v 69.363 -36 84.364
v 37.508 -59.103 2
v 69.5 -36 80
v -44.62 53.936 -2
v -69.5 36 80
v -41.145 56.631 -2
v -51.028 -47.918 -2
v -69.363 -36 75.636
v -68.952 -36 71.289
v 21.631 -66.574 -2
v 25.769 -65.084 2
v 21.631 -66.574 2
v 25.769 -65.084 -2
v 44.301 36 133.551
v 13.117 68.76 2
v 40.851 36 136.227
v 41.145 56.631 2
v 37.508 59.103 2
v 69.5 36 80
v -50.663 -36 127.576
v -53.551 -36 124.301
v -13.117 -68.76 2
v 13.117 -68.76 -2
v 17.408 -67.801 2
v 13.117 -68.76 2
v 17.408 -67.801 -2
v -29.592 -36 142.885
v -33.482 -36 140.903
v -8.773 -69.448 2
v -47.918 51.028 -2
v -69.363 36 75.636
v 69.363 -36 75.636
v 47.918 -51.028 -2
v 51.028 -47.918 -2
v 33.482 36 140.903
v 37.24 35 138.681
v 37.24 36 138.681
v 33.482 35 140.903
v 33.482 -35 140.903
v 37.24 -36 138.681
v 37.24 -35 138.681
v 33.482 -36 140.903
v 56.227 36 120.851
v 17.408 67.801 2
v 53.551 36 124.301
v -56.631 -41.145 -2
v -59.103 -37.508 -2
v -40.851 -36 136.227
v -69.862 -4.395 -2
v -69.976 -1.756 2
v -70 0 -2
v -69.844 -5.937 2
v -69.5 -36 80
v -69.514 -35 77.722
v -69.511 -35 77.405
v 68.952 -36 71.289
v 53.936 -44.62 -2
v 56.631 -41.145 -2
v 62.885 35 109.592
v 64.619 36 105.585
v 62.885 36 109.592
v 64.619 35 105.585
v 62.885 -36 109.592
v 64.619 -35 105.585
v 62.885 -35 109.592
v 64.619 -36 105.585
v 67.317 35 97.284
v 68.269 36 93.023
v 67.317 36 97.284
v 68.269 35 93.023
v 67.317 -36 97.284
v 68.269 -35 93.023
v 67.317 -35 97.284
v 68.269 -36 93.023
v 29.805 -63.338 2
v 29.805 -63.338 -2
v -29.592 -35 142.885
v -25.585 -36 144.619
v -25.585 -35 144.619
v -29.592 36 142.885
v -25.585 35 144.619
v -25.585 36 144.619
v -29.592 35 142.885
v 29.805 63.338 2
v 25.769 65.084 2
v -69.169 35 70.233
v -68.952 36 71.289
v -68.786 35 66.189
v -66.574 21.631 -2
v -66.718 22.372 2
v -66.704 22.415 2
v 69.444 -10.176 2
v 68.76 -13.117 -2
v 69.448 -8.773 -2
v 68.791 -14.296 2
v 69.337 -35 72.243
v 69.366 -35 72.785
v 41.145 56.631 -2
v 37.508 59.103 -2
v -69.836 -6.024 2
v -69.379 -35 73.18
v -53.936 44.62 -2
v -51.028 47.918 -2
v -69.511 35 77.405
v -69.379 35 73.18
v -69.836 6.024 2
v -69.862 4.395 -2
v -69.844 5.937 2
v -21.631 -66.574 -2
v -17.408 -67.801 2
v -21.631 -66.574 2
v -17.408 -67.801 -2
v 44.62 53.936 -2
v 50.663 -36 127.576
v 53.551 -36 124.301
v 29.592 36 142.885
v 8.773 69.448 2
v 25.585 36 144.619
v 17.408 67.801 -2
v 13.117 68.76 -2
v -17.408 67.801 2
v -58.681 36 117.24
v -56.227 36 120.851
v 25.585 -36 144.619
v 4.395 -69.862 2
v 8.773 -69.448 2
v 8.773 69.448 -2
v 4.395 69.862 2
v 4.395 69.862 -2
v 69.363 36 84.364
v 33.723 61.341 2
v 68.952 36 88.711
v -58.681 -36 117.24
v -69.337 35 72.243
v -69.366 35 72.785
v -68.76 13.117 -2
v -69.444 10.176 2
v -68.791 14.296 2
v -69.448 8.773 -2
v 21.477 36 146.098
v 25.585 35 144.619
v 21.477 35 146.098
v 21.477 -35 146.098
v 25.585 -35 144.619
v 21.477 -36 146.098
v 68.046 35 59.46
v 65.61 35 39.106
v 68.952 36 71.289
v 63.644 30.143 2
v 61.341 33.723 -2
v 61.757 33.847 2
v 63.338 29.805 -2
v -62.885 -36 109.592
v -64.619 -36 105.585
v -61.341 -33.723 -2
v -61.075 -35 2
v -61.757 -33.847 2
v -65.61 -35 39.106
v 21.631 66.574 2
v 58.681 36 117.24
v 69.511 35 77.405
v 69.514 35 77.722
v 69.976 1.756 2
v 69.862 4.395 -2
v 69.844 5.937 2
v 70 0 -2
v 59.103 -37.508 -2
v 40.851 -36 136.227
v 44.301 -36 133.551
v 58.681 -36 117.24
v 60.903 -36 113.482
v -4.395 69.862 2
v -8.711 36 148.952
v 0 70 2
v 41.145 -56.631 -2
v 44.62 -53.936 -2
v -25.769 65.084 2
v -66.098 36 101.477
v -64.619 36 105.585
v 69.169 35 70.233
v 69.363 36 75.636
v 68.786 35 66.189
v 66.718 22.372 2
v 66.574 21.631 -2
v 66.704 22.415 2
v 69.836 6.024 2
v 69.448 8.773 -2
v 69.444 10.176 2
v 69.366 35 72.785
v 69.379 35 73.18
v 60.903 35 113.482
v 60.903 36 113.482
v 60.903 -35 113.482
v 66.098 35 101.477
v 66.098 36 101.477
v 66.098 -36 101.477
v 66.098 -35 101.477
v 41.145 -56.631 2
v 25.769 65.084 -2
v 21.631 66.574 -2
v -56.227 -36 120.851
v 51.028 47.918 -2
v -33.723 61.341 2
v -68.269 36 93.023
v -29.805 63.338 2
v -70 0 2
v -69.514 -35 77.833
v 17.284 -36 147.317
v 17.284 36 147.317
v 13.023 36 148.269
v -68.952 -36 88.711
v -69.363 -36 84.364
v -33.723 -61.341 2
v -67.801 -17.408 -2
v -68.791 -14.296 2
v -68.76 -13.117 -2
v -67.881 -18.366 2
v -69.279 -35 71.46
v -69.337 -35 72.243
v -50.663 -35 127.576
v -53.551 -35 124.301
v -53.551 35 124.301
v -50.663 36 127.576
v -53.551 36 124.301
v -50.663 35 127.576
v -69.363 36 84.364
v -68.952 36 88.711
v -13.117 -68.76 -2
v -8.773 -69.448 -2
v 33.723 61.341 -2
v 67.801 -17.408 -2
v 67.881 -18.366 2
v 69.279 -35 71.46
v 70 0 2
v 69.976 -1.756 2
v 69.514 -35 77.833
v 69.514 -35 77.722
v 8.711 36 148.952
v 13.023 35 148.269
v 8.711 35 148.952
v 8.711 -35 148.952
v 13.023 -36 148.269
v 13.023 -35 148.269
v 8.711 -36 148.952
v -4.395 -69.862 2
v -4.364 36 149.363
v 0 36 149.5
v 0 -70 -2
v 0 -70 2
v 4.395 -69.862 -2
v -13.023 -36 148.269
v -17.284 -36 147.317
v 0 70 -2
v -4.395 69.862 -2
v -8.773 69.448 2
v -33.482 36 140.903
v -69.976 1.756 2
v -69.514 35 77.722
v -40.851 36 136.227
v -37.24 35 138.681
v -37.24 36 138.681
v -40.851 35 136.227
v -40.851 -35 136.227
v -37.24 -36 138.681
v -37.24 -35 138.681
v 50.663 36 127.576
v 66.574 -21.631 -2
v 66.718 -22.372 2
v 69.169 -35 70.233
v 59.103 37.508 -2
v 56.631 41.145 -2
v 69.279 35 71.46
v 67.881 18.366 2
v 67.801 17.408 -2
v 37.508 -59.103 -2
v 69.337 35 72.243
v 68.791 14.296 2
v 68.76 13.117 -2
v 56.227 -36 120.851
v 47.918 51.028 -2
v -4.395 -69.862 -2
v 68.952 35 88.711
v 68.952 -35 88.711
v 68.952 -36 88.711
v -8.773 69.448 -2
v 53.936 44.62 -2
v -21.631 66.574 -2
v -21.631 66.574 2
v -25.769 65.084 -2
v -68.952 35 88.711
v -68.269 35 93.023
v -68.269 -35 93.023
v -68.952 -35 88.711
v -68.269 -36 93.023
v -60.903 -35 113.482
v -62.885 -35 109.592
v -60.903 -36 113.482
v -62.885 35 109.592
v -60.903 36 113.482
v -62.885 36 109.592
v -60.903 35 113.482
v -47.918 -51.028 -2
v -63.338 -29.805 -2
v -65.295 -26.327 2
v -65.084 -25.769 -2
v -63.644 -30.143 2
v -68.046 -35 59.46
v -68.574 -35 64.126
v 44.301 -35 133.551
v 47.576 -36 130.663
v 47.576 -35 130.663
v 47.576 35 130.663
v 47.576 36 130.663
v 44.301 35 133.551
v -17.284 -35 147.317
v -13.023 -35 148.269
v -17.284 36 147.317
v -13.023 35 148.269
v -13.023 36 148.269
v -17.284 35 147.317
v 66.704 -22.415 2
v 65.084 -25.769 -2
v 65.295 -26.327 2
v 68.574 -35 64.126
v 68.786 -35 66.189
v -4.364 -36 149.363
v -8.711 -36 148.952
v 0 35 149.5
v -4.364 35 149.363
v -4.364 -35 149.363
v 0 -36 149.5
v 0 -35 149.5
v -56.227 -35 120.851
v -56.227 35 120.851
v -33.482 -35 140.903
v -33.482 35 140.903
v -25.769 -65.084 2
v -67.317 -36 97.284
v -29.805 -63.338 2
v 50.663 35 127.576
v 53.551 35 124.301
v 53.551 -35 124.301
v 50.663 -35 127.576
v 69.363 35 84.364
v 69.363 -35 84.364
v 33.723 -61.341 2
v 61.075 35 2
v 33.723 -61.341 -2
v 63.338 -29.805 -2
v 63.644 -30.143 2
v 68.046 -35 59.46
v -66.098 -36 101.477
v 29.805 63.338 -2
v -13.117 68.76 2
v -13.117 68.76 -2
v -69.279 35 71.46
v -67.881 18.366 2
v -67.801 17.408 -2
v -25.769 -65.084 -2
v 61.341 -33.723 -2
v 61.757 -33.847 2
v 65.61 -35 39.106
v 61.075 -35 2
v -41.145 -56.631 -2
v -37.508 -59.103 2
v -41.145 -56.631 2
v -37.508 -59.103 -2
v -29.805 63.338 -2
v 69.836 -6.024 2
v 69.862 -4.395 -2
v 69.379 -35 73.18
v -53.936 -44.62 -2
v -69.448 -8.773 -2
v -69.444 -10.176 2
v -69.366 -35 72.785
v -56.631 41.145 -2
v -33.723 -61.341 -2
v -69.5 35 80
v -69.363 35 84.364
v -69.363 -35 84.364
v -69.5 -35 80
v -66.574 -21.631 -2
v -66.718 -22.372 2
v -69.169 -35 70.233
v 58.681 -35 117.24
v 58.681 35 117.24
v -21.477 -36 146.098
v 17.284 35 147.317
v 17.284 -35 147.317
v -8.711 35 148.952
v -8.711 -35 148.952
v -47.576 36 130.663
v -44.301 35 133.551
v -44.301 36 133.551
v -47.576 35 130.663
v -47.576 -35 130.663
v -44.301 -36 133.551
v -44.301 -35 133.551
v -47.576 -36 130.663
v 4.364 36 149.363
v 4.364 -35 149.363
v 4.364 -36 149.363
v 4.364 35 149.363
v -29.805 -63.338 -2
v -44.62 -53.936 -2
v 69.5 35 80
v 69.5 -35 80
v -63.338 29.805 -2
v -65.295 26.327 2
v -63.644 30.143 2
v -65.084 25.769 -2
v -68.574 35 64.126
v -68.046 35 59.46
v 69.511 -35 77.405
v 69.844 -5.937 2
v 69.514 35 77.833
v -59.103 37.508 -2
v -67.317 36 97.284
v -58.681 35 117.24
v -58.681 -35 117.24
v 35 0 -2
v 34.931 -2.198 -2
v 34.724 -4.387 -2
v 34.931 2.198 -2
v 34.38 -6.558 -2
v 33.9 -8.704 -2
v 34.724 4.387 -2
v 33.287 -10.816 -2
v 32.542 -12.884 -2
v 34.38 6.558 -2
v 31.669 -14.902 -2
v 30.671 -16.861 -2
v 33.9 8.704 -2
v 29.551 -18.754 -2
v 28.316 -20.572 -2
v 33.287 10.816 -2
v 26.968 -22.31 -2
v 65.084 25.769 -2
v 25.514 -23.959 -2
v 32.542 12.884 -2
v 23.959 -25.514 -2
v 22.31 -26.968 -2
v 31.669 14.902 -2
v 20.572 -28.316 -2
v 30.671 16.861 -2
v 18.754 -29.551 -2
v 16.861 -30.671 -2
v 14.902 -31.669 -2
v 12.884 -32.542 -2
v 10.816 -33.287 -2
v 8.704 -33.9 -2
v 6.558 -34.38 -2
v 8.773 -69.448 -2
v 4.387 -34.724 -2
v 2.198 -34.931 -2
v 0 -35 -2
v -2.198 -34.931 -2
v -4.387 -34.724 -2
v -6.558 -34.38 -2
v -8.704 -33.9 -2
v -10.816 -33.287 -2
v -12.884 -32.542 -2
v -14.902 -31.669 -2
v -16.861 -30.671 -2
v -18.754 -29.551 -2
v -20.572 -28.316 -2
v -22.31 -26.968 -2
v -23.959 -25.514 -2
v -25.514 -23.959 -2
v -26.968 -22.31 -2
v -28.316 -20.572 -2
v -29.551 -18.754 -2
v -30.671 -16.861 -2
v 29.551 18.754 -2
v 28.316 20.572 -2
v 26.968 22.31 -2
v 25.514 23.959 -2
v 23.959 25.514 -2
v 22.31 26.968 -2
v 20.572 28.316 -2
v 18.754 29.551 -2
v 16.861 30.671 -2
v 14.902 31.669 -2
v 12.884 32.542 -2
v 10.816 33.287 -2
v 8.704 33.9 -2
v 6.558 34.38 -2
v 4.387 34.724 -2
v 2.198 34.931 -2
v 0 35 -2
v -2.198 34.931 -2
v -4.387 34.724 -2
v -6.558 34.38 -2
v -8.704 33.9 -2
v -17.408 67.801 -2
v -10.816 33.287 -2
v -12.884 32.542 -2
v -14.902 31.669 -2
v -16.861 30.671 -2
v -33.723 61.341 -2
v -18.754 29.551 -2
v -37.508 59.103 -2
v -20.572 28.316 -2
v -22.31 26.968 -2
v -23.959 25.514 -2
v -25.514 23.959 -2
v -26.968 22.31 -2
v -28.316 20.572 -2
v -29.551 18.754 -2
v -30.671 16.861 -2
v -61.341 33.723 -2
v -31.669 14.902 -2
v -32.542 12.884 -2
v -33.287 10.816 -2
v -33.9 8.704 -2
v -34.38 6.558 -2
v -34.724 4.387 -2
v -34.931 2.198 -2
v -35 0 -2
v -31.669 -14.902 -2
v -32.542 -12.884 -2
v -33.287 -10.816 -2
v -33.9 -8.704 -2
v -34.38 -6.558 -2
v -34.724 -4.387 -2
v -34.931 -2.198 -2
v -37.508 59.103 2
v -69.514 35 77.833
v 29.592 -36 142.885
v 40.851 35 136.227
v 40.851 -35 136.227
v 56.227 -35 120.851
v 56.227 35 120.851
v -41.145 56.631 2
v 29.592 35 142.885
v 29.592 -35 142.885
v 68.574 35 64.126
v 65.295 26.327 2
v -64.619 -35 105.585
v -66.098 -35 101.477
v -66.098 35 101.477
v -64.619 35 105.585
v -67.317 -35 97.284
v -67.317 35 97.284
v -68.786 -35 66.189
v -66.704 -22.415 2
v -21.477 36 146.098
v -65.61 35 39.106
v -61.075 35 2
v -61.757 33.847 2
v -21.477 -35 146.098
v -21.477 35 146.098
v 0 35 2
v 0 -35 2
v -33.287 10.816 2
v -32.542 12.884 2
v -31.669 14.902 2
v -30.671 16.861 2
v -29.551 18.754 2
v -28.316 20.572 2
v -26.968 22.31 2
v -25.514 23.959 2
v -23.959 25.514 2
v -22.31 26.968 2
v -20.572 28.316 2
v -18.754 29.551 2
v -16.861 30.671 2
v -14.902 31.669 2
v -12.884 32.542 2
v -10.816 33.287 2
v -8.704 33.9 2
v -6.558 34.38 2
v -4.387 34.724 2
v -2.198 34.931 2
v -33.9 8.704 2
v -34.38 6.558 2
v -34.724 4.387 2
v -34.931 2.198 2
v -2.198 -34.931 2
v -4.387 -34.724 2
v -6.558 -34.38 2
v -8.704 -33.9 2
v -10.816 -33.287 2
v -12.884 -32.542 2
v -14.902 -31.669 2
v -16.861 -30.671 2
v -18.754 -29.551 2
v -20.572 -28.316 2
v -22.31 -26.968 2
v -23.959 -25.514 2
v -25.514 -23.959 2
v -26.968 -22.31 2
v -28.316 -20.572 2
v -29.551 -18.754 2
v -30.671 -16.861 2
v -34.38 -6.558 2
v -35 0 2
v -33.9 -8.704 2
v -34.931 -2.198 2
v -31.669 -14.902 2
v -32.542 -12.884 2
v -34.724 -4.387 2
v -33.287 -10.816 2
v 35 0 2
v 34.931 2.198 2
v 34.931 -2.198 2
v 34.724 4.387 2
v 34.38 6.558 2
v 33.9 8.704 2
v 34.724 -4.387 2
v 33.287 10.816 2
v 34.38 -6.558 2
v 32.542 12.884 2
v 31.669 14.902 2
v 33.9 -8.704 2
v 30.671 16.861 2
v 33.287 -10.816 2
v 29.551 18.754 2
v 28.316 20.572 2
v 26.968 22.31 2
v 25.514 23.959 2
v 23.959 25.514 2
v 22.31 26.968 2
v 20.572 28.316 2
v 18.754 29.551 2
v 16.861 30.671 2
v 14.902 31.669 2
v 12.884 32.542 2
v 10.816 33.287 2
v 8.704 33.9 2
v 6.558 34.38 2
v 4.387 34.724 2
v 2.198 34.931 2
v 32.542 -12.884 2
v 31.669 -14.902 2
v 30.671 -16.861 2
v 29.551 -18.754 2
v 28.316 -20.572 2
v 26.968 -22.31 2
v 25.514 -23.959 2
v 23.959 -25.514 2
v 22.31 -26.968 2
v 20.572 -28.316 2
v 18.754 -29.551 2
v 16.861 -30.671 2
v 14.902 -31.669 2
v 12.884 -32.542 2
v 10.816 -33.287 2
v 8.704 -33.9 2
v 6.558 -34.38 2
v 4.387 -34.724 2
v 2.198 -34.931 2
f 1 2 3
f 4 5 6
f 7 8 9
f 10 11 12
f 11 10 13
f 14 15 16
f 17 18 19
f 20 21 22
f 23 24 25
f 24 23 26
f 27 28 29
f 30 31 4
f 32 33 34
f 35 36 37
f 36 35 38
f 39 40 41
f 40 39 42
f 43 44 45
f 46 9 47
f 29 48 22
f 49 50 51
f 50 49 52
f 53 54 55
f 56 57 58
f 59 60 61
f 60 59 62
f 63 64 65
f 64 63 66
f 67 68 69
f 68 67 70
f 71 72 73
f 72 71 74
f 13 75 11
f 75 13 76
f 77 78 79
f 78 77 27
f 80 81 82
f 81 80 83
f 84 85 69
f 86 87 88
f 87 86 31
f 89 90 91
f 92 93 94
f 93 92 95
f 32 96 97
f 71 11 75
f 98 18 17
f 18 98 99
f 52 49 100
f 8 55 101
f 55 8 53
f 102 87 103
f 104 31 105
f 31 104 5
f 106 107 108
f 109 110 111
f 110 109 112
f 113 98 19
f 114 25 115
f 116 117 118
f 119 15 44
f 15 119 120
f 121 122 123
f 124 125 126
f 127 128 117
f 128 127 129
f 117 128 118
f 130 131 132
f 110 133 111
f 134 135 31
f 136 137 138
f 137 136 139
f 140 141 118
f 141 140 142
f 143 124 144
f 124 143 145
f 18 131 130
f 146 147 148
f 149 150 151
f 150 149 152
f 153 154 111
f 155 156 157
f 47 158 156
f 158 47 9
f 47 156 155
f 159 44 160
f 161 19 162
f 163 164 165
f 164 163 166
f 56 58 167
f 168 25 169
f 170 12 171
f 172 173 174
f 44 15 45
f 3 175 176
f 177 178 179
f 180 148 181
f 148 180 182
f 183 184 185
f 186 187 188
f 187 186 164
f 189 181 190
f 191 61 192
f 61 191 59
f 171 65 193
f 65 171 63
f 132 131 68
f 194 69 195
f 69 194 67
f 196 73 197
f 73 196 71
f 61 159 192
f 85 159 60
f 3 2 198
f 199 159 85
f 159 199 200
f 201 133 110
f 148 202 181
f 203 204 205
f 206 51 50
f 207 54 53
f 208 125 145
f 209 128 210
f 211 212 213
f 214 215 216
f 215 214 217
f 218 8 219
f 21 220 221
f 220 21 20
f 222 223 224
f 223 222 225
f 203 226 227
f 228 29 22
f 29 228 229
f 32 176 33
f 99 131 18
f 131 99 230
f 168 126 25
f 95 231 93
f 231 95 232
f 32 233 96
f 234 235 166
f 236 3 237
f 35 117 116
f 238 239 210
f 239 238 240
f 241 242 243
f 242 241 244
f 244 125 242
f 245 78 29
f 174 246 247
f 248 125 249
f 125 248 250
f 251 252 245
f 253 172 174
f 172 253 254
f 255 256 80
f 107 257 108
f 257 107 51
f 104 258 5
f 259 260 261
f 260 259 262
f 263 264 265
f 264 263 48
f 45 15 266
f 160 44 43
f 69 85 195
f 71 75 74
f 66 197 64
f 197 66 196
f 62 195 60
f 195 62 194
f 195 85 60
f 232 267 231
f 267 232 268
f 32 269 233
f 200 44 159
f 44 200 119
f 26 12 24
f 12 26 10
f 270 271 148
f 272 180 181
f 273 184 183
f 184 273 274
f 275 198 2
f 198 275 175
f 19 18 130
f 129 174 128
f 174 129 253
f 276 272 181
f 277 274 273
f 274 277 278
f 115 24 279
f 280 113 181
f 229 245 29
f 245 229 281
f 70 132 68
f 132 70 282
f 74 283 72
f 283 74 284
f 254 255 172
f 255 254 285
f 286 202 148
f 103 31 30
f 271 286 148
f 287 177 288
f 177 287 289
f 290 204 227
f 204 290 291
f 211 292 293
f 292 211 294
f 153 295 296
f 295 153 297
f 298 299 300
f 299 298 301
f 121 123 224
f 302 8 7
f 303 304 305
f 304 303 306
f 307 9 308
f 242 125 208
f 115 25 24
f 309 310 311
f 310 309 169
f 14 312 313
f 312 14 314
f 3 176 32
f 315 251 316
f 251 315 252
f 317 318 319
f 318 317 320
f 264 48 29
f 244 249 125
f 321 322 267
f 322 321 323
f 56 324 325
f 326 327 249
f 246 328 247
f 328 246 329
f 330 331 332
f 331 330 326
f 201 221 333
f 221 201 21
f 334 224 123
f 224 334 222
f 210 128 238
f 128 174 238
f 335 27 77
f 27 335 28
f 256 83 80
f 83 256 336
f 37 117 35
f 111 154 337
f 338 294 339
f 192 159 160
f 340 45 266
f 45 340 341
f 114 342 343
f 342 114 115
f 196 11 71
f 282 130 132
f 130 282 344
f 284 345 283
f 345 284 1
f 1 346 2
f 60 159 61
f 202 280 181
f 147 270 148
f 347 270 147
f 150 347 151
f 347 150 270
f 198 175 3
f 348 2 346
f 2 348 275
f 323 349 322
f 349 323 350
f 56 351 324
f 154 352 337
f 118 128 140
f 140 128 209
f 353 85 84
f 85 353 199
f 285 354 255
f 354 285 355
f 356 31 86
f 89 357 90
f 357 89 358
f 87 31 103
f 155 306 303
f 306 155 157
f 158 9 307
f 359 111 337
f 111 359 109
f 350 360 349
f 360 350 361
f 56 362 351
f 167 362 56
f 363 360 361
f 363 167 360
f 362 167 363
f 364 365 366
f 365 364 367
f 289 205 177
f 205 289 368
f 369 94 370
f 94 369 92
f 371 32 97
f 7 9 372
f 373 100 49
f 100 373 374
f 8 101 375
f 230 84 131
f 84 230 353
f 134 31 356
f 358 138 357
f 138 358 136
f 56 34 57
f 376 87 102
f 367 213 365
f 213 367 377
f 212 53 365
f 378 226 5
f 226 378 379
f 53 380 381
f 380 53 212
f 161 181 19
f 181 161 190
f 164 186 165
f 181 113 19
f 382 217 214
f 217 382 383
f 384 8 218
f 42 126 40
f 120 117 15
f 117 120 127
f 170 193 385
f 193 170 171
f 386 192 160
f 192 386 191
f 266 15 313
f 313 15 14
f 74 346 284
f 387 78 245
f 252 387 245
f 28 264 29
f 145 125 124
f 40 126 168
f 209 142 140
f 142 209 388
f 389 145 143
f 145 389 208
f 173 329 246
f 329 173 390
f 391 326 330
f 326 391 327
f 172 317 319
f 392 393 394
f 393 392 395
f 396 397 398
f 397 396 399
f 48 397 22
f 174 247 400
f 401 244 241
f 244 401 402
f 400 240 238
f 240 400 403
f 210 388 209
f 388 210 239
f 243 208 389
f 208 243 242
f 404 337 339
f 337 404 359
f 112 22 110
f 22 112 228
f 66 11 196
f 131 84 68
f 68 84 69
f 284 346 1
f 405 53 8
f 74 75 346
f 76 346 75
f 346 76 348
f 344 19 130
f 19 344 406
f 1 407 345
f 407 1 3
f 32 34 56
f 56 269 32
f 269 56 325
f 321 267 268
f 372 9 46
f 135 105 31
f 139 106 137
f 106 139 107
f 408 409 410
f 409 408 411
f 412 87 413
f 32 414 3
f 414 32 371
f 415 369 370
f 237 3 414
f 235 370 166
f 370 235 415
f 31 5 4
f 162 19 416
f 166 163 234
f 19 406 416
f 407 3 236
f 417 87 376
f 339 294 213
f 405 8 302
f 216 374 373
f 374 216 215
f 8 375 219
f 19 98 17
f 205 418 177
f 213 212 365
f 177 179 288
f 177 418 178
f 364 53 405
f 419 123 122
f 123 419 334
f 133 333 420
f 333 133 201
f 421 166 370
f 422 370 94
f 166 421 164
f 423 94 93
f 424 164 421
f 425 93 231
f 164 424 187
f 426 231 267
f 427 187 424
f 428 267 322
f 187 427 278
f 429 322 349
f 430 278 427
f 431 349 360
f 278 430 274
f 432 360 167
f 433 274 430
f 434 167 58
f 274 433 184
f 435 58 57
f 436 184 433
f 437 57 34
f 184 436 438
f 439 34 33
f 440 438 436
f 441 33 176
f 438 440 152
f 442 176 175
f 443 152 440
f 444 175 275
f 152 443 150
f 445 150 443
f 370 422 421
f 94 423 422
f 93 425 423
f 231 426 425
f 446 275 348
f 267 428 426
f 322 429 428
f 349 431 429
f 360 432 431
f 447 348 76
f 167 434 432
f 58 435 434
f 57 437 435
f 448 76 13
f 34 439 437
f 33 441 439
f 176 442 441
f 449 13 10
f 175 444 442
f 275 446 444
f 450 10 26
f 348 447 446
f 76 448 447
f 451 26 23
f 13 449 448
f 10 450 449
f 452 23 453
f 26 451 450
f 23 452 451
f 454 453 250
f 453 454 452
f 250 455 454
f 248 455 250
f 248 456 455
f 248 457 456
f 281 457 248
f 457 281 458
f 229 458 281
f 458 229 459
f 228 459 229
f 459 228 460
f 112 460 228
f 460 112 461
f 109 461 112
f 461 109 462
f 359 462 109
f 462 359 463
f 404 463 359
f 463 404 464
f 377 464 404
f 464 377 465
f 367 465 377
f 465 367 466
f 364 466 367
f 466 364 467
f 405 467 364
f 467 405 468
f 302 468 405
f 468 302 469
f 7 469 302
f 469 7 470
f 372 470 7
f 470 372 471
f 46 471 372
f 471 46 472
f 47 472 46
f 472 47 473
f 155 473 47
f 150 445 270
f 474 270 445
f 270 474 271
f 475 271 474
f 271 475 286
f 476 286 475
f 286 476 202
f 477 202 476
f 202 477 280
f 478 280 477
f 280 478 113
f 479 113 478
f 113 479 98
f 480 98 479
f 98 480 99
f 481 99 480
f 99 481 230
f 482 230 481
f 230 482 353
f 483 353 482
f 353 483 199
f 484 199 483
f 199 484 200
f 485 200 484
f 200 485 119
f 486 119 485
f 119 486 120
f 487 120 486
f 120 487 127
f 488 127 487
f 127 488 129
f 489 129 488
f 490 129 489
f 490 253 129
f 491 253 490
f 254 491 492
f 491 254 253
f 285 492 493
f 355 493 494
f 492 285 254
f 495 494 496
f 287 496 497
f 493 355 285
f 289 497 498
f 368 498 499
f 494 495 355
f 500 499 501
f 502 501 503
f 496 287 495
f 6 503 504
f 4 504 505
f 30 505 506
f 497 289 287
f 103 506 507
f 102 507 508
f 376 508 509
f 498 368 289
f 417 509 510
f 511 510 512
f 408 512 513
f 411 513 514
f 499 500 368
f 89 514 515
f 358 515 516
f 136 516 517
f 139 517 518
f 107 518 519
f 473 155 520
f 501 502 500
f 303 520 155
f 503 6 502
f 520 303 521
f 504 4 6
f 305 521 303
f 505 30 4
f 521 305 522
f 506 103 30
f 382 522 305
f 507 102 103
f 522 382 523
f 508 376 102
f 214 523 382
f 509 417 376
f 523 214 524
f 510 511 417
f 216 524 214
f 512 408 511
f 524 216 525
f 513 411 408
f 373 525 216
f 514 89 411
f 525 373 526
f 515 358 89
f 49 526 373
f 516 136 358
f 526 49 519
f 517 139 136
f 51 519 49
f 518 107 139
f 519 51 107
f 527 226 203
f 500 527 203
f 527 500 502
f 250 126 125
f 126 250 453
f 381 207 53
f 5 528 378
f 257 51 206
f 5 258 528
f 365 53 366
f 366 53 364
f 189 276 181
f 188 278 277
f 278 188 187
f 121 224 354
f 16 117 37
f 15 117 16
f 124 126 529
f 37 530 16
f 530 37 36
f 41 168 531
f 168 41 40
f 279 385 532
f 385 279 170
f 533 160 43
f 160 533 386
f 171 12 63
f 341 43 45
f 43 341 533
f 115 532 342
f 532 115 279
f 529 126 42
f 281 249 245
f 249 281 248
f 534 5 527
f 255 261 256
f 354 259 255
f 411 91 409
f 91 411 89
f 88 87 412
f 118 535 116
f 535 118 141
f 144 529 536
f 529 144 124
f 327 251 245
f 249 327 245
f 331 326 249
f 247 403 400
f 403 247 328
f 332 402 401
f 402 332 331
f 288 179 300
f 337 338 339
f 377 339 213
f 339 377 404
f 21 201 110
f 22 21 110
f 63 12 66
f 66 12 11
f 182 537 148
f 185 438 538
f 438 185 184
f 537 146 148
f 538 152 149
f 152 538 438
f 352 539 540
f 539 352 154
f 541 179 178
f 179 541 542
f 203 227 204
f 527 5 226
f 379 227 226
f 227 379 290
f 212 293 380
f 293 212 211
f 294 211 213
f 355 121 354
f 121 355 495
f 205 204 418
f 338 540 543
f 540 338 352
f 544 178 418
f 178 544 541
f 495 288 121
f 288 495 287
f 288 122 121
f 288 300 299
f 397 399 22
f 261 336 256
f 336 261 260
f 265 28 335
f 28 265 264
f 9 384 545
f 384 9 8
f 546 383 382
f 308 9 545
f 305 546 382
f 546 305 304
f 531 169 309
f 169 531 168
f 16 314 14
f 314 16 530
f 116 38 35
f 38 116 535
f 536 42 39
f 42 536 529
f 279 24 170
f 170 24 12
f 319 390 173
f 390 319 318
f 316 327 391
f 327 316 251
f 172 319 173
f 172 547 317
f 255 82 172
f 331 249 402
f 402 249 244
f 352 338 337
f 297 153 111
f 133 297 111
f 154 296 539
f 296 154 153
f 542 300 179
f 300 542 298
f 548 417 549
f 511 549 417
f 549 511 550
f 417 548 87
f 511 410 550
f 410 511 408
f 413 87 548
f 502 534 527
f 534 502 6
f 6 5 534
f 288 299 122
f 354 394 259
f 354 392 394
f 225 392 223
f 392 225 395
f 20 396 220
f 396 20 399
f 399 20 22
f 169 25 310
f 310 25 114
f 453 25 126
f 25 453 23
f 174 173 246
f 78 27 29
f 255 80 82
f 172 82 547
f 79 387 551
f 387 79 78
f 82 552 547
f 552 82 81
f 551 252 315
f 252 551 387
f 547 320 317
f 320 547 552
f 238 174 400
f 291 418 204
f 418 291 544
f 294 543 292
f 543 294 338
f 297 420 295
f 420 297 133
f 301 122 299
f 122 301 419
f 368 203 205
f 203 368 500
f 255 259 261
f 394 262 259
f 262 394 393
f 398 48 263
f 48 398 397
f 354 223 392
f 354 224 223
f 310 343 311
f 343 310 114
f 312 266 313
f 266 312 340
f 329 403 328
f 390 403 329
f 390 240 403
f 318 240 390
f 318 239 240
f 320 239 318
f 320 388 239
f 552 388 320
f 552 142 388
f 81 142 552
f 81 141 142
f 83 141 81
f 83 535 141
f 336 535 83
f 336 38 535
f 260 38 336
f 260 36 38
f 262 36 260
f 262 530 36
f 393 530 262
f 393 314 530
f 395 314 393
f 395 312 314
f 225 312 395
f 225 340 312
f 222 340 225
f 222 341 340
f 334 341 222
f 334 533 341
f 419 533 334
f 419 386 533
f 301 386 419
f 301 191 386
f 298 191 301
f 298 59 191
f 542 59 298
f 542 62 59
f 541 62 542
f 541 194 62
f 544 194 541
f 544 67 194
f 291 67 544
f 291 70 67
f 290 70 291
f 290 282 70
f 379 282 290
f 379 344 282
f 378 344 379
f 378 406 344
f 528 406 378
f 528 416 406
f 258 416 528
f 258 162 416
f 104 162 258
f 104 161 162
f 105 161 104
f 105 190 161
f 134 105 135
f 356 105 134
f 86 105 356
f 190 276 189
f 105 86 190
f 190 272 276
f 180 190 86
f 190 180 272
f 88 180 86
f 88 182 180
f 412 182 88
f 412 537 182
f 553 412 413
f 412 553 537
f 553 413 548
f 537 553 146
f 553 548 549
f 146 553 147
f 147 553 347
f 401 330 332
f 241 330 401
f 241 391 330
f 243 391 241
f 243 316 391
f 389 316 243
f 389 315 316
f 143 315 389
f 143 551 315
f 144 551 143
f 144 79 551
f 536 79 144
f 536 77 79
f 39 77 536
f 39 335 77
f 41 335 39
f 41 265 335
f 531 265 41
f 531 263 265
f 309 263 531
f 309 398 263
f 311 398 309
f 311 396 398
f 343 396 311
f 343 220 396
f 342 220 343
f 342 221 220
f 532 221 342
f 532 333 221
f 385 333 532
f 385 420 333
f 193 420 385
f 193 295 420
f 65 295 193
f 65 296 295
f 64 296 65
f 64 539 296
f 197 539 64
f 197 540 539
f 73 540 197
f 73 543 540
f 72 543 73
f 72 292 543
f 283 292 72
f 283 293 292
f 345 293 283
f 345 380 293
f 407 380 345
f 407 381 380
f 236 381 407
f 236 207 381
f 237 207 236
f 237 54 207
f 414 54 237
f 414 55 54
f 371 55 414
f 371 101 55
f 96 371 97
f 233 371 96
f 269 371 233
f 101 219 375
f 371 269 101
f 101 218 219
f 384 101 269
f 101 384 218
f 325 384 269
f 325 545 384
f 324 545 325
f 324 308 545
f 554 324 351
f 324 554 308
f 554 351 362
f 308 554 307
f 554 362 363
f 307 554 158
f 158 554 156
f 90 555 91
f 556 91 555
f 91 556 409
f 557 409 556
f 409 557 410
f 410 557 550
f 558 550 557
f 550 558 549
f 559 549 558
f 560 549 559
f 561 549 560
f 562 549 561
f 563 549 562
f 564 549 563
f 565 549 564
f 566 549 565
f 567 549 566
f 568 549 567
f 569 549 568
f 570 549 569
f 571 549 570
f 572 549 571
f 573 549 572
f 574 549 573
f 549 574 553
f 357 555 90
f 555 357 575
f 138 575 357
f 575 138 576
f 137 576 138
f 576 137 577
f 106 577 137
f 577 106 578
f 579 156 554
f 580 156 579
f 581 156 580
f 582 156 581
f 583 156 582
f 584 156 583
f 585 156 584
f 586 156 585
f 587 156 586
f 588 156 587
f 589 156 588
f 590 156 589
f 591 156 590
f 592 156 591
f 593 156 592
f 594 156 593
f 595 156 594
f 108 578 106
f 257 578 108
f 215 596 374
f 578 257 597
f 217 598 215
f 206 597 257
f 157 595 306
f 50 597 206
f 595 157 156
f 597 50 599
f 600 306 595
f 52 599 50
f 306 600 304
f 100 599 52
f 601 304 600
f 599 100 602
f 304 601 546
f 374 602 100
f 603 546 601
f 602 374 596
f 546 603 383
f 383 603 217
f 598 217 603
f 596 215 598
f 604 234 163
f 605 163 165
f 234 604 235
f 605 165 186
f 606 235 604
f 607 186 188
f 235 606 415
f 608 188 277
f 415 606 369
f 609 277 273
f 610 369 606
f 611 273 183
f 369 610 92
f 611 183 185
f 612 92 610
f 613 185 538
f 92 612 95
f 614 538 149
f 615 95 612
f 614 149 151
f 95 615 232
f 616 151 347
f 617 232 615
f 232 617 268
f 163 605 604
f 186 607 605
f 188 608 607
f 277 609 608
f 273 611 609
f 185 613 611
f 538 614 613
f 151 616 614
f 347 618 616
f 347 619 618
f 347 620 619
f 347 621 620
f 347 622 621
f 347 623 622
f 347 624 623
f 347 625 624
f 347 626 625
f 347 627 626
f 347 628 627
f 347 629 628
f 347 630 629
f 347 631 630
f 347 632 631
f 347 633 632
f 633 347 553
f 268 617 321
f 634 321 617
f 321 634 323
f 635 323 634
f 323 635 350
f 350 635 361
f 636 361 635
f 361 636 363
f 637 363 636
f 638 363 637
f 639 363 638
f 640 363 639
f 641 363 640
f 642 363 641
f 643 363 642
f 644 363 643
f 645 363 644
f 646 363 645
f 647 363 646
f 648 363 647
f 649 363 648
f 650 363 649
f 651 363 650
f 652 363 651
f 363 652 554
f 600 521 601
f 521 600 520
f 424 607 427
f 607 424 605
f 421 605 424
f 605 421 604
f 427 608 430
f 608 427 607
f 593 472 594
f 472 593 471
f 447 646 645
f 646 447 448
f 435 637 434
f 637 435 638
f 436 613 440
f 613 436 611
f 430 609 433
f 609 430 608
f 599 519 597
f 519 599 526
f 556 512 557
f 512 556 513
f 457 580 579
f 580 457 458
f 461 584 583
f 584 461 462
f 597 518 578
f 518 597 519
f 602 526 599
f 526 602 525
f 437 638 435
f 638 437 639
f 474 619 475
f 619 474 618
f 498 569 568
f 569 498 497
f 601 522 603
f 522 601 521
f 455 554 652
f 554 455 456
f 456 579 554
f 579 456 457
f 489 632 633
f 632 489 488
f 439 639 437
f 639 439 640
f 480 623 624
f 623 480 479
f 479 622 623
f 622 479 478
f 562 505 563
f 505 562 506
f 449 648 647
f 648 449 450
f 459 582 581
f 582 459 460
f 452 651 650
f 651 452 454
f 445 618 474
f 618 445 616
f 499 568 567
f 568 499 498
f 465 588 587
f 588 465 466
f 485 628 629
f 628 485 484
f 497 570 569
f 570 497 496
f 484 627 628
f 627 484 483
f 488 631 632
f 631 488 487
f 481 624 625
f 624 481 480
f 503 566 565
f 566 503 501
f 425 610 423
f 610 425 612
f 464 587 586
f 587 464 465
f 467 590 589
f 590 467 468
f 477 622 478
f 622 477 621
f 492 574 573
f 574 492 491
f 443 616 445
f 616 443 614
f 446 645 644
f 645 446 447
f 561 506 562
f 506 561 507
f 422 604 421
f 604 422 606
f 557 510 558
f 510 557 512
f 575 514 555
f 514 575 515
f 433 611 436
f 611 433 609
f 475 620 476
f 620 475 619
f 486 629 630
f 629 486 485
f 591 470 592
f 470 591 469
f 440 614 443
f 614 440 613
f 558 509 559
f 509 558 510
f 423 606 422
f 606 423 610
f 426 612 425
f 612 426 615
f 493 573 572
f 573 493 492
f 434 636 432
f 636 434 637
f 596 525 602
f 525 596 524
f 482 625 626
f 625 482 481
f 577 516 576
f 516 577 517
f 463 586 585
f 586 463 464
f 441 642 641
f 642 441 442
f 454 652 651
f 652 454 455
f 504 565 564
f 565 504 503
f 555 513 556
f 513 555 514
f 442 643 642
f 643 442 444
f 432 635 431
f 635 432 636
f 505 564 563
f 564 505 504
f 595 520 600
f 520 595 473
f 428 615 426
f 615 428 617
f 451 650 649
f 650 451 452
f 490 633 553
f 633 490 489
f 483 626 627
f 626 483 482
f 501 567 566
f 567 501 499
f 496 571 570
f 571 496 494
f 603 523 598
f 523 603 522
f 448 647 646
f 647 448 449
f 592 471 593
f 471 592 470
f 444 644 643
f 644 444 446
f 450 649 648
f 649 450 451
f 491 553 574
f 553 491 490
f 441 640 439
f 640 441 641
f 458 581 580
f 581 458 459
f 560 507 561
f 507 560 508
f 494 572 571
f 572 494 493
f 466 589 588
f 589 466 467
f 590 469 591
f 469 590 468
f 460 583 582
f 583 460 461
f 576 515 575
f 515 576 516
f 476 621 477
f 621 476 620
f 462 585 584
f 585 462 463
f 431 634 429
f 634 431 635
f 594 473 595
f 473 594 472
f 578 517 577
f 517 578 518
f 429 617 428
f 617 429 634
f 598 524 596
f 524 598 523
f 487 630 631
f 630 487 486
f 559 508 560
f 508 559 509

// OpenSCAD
//base radius
r=70;

//base height
b=4;

//height
h=150;

//thickness
t=70;

// translate height
y=80;

difference(){
hull(){
cylinder(h = b, r=r, center=true, $fn=100); //bottom
translate([0,0,y])rotate([90,0,0])cylinder(h = t+2, r=r-0.5, center=true, $fn=100); //top
}
rotate([0,0,90])translate([0,0,h/2+b/2])cube(size = [t,2*t,h], center = true);
cylinder(h=b+1, r=r/2, center=true, $fn=100); //cut out bottom
}
